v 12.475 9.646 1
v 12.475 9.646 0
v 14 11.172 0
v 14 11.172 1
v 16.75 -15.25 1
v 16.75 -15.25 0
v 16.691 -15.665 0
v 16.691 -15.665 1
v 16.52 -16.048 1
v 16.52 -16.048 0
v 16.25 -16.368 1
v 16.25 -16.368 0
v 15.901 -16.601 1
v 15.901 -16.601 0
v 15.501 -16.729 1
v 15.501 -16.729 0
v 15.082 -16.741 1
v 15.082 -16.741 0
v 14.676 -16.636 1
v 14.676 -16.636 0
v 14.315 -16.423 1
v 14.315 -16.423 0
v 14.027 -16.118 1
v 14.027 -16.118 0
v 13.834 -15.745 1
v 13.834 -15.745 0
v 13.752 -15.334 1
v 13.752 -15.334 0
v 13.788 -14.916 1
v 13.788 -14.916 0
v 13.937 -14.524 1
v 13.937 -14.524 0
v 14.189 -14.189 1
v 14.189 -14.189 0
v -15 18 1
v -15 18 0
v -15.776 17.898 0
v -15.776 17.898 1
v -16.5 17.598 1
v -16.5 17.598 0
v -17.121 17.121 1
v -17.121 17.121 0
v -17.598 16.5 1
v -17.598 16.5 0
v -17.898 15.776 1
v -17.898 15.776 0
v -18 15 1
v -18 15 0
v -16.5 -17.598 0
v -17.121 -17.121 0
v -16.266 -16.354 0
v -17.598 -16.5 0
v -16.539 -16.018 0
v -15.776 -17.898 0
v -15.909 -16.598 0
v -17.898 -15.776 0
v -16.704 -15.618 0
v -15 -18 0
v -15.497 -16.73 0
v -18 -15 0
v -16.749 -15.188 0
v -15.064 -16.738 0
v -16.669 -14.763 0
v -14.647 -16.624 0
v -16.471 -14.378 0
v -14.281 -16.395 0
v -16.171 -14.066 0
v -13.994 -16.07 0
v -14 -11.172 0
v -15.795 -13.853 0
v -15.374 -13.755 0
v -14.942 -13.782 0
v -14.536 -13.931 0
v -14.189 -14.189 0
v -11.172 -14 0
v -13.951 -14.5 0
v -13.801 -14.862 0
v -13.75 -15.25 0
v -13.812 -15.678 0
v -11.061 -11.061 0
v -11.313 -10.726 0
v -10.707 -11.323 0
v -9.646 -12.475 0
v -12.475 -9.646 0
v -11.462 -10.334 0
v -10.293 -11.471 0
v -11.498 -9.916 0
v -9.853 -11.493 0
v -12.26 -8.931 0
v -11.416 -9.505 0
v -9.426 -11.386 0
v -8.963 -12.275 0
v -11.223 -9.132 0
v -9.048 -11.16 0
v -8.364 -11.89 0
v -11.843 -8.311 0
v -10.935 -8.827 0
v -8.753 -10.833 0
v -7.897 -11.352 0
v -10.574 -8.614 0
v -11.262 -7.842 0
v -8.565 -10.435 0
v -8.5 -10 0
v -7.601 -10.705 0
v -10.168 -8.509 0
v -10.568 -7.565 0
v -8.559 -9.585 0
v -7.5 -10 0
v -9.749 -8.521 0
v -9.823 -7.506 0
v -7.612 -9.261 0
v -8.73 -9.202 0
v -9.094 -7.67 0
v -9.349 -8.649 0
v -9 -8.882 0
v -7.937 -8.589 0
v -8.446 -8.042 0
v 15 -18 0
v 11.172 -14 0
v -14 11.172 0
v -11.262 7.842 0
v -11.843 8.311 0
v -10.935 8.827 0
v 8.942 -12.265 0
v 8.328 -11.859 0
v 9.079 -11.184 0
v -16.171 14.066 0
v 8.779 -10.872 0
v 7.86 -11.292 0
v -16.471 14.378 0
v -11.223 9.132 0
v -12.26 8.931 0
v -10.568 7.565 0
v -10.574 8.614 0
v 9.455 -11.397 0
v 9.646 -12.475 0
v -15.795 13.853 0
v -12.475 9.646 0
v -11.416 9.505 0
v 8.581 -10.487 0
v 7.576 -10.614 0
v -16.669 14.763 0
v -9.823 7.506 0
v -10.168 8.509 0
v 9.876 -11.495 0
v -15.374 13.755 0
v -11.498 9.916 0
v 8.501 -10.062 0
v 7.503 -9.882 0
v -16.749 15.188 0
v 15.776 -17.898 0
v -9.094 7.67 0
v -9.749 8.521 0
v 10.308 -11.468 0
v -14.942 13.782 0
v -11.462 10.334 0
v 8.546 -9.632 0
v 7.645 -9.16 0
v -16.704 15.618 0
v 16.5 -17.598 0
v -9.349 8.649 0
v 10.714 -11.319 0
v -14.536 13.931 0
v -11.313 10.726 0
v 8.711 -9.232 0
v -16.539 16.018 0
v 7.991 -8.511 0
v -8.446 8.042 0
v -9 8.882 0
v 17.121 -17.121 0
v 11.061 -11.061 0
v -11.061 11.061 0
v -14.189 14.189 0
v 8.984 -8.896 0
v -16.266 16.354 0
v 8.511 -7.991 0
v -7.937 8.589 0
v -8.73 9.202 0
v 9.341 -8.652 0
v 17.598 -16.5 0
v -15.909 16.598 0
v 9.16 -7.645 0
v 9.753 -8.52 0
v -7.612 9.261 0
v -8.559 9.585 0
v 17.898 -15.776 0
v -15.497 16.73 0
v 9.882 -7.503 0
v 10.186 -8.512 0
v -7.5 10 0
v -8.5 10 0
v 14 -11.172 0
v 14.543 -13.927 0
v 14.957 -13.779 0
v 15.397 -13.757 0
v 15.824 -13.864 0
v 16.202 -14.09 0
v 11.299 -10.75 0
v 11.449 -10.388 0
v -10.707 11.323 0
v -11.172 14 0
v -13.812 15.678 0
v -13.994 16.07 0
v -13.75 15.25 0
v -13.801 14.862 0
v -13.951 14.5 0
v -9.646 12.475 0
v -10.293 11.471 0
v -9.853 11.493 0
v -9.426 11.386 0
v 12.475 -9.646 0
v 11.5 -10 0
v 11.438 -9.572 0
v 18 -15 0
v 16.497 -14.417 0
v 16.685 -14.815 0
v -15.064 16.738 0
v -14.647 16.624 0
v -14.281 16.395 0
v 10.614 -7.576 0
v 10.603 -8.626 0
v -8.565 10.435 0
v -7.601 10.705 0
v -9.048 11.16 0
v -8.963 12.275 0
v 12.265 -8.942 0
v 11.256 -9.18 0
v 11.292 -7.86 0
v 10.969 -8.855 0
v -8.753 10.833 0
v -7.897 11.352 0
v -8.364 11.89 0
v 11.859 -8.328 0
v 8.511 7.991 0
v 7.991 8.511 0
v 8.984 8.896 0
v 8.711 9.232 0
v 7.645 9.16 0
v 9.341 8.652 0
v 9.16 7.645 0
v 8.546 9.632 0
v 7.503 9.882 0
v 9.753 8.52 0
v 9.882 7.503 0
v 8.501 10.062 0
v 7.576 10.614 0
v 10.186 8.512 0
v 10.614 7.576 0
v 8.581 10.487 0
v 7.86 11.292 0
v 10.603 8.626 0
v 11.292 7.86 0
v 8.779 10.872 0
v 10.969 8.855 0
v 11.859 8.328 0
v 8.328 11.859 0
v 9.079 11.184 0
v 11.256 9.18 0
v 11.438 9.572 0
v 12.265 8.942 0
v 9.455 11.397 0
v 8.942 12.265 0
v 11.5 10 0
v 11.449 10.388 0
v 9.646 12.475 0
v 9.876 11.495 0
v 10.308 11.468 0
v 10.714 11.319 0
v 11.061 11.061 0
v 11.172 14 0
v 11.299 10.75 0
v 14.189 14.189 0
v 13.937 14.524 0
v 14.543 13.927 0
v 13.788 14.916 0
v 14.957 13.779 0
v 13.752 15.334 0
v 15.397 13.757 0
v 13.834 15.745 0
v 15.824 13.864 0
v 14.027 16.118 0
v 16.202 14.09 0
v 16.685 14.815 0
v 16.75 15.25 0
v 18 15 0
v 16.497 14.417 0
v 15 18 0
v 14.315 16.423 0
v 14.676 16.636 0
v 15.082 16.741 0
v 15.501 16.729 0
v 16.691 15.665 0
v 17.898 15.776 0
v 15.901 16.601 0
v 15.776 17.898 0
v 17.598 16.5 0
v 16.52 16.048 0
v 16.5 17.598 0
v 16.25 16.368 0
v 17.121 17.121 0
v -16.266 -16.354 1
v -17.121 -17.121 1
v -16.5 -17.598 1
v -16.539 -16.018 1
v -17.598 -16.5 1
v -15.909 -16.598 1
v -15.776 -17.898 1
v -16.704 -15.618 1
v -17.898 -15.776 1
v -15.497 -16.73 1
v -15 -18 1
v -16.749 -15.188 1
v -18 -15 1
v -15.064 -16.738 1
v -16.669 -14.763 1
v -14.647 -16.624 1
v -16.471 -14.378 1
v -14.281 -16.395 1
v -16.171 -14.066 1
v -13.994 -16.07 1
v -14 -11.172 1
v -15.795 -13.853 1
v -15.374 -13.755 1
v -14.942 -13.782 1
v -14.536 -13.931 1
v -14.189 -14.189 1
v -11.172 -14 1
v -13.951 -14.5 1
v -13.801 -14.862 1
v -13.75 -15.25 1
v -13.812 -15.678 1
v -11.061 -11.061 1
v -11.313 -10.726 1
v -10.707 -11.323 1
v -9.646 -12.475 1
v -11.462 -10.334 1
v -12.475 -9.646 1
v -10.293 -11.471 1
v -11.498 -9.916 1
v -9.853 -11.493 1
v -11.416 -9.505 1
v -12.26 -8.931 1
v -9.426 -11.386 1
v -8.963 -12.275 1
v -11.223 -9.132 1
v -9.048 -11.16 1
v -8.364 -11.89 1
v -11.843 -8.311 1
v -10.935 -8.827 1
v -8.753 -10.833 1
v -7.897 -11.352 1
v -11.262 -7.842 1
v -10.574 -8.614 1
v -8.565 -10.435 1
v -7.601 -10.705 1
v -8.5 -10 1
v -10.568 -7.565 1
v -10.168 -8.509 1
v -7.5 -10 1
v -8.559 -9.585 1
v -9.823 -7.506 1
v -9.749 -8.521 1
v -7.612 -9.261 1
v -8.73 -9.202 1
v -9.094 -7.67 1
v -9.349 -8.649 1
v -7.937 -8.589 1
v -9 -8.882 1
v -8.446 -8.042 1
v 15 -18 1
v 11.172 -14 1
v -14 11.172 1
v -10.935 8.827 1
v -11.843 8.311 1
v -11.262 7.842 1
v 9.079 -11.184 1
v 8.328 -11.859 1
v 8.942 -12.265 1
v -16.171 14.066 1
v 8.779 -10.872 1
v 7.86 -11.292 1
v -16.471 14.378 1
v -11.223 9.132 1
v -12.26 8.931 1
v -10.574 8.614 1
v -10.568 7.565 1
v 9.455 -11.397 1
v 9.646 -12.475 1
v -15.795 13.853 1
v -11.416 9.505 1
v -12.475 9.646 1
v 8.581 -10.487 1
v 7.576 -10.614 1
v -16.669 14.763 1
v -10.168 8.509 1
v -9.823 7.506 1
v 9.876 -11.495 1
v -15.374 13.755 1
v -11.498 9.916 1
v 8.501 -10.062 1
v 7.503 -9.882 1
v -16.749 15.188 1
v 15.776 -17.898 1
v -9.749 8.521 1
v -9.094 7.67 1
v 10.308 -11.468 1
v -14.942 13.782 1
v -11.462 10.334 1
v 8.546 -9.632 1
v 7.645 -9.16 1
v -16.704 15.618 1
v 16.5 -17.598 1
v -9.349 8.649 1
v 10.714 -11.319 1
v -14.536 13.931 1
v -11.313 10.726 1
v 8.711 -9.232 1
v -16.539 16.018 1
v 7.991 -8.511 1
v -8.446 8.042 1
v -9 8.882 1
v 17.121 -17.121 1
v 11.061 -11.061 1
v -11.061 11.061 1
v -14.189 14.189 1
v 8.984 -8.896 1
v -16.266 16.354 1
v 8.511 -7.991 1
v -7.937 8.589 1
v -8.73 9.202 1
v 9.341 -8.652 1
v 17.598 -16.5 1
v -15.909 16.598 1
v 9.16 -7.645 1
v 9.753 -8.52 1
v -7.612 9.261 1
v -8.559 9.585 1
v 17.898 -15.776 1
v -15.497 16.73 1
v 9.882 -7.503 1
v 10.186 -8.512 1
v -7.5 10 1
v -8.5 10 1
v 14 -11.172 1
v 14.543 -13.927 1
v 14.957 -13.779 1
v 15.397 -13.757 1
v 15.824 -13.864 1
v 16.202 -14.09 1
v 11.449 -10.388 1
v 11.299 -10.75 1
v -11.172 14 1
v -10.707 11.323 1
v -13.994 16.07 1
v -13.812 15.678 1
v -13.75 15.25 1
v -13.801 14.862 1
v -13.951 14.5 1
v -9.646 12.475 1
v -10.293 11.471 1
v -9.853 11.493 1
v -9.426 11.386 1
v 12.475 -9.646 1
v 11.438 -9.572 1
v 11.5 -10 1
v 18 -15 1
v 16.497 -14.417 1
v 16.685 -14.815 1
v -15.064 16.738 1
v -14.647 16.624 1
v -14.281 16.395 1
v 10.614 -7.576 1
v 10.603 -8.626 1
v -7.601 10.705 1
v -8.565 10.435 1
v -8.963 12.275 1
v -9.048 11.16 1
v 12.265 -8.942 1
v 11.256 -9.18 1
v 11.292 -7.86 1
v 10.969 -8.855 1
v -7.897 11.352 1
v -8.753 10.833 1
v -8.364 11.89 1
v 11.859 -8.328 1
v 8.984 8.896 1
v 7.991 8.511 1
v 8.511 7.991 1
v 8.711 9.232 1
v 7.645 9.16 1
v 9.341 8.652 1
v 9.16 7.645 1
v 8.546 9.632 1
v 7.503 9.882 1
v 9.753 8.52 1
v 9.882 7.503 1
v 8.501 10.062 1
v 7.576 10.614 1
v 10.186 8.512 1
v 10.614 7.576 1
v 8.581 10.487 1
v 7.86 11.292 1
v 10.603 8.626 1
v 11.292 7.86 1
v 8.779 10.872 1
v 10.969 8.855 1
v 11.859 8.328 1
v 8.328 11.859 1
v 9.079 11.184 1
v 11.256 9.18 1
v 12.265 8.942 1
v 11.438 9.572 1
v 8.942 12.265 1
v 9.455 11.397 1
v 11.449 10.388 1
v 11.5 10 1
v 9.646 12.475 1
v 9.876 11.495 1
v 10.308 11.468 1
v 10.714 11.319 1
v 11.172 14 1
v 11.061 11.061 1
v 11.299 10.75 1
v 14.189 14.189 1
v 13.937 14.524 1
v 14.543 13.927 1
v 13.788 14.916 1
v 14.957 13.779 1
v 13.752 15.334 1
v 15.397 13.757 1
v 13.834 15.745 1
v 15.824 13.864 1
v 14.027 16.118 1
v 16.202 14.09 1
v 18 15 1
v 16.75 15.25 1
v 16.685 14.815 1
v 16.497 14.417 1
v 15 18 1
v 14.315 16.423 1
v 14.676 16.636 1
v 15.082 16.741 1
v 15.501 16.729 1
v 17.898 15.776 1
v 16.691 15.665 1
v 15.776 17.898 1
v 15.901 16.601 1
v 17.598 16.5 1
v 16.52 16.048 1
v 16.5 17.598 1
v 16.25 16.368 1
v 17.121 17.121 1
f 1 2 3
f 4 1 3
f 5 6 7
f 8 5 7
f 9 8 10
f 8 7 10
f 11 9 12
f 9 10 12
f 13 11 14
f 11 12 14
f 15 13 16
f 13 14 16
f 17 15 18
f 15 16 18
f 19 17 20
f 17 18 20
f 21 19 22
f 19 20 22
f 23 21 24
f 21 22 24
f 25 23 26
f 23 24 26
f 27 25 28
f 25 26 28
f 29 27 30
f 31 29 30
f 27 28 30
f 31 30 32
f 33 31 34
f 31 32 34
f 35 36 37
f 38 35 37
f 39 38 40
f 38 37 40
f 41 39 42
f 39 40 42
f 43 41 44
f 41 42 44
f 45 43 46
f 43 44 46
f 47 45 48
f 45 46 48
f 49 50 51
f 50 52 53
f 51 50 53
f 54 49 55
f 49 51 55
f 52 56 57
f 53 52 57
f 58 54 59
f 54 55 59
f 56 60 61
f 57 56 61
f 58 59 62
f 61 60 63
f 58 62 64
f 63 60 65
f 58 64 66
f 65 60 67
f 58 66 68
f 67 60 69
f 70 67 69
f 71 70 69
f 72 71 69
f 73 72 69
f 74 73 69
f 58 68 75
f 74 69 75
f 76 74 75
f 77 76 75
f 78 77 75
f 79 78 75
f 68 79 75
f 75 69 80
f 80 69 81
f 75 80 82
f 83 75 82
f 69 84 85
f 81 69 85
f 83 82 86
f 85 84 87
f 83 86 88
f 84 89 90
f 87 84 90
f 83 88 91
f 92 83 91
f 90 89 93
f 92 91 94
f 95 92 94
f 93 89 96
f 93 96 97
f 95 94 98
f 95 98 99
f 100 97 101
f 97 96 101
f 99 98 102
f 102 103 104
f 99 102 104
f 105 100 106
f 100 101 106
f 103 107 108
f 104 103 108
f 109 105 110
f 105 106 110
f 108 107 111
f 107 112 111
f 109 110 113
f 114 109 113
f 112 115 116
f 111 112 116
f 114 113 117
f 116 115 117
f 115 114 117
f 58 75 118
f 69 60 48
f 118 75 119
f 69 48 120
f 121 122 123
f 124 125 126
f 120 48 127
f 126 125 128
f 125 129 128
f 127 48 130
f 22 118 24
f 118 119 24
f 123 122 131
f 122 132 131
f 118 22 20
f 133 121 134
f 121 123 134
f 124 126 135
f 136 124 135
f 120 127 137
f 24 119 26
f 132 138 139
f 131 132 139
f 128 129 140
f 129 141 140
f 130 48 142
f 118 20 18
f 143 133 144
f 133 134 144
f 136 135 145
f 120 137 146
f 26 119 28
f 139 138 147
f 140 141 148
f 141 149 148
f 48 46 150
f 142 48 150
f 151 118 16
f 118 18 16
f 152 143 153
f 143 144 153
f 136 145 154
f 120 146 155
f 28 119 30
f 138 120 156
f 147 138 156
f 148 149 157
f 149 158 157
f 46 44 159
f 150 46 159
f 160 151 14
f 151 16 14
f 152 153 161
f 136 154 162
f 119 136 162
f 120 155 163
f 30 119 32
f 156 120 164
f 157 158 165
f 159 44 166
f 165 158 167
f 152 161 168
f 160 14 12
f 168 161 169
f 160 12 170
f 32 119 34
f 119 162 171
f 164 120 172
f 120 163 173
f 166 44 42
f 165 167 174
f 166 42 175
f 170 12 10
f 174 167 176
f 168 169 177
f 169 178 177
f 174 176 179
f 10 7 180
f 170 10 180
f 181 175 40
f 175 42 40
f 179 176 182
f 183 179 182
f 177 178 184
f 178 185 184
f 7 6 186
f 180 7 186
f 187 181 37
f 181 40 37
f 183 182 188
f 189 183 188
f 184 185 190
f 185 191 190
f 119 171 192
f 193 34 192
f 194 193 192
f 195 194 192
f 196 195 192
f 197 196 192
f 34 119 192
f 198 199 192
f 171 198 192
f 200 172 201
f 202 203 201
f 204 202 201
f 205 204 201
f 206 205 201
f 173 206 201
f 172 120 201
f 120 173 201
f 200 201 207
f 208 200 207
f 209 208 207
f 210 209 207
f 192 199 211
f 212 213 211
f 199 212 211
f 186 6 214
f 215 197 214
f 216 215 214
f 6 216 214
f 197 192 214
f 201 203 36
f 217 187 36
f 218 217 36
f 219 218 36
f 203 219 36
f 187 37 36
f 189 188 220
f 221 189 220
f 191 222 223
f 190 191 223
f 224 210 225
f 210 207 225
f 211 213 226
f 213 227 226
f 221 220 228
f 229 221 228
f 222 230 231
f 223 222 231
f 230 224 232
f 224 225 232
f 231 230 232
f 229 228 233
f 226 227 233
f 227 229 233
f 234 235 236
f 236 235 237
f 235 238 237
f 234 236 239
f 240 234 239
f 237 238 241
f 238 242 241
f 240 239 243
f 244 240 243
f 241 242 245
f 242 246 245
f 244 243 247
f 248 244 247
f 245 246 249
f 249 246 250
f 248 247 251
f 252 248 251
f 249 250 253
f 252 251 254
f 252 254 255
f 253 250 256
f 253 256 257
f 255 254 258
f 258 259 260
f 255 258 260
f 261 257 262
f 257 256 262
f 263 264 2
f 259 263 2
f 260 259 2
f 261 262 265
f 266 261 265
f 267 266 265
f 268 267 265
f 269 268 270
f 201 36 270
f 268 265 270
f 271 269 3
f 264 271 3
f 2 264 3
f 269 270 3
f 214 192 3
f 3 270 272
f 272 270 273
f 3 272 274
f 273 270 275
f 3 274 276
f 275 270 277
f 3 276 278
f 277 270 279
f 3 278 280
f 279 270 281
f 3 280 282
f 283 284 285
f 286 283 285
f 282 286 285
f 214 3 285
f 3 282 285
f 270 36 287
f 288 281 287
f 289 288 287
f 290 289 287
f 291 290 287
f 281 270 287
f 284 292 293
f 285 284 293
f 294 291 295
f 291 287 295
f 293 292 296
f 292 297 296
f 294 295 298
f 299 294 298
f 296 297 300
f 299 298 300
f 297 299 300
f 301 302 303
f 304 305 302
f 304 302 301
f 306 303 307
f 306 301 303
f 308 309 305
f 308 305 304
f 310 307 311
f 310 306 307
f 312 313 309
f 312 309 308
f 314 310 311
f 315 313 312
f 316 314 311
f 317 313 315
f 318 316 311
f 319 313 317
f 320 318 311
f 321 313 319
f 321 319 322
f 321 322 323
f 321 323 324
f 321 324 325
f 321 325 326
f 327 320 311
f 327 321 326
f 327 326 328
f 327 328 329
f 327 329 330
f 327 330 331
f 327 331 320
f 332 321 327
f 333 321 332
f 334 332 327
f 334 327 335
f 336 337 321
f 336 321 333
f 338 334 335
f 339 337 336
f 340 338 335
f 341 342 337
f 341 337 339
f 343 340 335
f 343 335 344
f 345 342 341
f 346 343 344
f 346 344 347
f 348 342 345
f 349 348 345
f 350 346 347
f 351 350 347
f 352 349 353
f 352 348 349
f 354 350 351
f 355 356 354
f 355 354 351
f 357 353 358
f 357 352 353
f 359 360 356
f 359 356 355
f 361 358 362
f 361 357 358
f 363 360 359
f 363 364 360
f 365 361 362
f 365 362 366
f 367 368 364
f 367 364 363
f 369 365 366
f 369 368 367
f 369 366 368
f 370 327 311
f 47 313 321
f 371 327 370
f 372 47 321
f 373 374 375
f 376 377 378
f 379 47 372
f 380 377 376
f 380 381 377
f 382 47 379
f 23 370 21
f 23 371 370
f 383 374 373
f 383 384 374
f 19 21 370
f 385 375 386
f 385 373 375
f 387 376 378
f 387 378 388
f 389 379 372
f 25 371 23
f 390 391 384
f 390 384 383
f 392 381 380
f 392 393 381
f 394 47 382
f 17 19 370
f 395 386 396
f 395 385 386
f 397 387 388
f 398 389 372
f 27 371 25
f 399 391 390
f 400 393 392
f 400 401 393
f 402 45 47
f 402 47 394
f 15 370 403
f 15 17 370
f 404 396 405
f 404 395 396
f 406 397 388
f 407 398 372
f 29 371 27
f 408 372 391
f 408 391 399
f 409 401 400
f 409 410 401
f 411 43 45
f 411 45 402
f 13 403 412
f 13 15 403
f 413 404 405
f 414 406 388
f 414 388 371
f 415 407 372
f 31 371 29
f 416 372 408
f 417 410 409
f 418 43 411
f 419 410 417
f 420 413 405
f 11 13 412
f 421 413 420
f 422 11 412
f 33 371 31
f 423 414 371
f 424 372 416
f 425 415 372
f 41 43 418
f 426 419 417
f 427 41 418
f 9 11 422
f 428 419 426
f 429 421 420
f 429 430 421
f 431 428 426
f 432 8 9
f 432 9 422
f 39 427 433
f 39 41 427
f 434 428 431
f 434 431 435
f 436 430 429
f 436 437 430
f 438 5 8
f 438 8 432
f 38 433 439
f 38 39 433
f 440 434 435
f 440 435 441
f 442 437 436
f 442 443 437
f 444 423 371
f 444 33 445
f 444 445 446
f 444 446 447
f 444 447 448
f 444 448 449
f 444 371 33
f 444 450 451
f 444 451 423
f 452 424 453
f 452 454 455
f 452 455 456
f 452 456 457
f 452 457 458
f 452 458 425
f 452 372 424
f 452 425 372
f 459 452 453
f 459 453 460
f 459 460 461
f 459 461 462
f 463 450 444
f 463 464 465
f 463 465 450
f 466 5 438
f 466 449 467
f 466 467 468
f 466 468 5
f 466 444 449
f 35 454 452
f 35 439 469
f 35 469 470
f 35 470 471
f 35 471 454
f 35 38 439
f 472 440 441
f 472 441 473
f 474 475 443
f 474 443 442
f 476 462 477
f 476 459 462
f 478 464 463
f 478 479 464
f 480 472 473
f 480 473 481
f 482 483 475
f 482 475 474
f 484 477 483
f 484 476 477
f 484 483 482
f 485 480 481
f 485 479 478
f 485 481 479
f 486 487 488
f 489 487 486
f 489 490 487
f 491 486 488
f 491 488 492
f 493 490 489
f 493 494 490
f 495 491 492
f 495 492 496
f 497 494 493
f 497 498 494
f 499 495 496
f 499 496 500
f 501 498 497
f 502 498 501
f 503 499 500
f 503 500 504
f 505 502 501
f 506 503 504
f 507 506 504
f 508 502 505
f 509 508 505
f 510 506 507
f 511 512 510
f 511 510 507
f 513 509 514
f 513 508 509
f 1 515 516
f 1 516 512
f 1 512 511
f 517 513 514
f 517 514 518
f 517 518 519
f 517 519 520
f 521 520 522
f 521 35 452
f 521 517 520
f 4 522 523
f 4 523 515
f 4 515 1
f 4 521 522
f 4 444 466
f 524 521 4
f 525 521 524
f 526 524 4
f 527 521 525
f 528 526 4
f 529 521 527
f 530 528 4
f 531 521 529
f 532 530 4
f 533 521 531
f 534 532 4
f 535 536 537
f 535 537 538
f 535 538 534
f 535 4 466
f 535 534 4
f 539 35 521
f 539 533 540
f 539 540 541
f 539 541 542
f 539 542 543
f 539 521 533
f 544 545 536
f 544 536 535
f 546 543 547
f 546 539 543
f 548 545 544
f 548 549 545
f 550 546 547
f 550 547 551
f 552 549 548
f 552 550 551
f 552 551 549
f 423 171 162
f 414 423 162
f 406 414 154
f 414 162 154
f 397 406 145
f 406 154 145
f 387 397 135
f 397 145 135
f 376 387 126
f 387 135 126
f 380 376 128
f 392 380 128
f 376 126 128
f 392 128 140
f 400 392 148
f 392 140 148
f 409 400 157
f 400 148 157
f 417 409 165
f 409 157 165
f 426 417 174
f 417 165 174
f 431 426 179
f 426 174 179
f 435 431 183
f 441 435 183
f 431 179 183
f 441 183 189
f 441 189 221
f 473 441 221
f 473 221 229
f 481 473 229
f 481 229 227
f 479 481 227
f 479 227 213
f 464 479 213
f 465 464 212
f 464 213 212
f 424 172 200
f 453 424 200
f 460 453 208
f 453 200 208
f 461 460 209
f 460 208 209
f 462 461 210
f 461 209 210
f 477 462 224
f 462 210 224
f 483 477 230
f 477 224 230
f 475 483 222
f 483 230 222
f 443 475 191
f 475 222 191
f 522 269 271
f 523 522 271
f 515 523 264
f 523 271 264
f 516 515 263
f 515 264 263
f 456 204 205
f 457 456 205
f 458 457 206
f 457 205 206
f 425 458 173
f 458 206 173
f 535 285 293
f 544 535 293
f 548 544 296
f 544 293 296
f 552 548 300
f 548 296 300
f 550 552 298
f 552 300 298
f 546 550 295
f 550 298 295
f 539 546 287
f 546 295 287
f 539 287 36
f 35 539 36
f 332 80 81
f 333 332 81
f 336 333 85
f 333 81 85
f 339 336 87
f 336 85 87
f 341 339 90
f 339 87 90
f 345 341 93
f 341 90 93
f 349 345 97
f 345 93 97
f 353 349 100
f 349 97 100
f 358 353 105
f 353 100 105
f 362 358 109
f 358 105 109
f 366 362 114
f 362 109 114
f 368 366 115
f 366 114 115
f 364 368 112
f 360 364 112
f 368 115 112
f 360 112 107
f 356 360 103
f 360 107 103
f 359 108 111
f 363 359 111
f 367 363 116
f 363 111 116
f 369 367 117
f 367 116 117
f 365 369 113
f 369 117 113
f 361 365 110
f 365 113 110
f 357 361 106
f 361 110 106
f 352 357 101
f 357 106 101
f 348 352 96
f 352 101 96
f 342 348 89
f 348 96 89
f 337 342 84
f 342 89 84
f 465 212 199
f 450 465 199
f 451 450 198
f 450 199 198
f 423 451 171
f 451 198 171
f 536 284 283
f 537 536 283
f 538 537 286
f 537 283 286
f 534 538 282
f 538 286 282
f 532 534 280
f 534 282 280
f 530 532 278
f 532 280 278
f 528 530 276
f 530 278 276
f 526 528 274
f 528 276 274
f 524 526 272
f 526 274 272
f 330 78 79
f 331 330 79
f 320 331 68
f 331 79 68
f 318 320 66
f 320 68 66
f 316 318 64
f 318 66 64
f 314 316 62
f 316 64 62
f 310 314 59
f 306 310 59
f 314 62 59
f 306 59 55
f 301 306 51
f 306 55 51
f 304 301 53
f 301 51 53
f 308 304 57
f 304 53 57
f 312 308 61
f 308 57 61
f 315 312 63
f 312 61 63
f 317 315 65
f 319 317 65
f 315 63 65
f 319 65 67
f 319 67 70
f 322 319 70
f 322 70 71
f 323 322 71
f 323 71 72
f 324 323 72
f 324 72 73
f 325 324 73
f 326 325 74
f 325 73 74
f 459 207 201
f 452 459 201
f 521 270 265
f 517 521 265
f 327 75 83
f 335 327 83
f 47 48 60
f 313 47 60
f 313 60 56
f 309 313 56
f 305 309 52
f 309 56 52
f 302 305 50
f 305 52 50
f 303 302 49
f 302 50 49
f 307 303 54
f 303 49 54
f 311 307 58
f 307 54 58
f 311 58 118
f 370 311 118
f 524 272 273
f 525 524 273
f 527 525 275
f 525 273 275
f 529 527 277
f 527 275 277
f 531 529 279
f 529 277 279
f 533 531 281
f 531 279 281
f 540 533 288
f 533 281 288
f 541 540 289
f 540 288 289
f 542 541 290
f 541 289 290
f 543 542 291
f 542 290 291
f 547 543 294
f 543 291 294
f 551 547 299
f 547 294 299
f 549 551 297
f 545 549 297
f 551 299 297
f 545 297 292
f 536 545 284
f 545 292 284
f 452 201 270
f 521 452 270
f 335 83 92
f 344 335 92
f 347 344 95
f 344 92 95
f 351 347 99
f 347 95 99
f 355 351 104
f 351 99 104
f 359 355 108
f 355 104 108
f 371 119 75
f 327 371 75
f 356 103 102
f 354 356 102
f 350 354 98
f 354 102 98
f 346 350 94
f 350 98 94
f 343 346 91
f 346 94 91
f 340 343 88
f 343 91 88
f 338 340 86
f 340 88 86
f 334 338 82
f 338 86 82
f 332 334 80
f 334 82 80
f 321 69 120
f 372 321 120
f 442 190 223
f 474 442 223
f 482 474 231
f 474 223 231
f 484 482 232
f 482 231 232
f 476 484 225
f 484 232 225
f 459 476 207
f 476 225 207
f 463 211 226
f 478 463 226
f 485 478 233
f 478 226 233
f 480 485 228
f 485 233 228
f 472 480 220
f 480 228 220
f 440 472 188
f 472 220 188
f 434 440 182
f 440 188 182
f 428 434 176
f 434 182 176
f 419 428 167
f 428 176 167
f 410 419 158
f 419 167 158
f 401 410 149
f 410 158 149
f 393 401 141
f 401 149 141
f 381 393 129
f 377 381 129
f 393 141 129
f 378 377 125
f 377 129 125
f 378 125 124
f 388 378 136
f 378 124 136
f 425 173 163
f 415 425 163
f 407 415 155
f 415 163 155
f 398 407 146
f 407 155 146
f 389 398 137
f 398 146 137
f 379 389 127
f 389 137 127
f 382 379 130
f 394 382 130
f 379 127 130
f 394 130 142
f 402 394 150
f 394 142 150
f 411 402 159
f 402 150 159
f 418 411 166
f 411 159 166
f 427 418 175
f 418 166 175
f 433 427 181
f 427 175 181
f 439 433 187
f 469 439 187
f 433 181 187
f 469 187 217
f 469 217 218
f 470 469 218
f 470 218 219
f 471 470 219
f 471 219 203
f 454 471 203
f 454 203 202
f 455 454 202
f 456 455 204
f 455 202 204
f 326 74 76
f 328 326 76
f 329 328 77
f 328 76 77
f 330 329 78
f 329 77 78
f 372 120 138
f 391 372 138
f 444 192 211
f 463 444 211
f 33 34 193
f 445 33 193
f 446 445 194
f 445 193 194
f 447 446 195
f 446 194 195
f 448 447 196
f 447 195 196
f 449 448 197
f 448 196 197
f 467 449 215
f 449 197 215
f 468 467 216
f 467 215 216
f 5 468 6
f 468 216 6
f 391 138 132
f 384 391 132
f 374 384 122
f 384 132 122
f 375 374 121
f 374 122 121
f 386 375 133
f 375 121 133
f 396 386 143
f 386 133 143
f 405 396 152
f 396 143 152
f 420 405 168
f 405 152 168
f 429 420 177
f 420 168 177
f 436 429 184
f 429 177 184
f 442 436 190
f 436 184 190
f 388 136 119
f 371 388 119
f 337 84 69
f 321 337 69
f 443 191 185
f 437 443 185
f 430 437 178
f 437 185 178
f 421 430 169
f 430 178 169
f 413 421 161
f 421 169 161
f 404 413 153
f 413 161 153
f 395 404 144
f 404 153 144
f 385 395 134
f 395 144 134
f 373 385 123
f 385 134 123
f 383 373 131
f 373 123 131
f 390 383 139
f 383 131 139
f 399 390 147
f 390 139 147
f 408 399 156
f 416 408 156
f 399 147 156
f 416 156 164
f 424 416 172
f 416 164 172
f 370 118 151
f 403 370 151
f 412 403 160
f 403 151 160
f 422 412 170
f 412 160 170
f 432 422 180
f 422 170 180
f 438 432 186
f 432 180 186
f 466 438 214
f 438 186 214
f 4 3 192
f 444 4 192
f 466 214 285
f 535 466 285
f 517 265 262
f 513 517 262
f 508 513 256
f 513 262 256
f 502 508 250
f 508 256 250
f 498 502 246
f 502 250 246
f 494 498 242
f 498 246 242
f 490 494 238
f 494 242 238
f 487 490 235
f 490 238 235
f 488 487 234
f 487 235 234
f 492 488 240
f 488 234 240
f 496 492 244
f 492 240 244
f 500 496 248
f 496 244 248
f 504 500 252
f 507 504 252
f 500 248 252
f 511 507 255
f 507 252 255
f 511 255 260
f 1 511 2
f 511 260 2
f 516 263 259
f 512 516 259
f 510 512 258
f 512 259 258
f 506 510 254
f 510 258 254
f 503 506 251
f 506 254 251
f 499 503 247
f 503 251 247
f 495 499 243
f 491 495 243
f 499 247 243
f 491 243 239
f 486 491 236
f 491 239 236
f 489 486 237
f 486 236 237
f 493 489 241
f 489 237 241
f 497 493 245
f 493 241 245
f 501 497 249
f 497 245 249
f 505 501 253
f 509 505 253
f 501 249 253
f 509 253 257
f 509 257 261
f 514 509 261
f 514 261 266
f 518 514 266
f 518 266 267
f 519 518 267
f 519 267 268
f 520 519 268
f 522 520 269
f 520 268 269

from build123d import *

# Parameters (mm, degrees)
F1_DEPTH = 1


with BuildPart() as f1:
    # F0 (on Top) → F1 (new body)
    with BuildSketch(Plane.XY):
        with BuildLine():
            Line((15, 18), (-15, 18))
            ThreePointArc((-15, 18), (-17.1213203436, 17.1213203436), (-18, 15))
            Line((-18, 15), (-18, -15))
            ThreePointArc((-18, -15), (-17.1213203436, -17.1213203436), (-15, -18))
            Line((-15, -18), (15, -18))
            ThreePointArc((15, -18), (17.1213203436, -17.1213203436), (18, -15))
            Line((18, -15), (18, 15))
            ThreePointArc((18, 15), (17.1213203436, 17.1213203436), (15, 18))
        make_face()
        with BuildLine():
            ThreePointArc((-13.75, -15.25), (-16.6358192988, -15.8240251485), (-14.1893398282, -14.1893398282))
            ThreePointArc((-14.1893398282, -14.1893398282), (-13.8641807012, -14.6759748515), (-13.75, -15.25))
        make_face(mode=Mode.SUBTRACT)
        with BuildLine():
            ThreePointArc((16.75, -15.25), (14.6759748515, -16.6358192988), (14.1893398282, -14.1893398282))
            ThreePointArc((14.1893398282, -14.1893398282), (15.8240251485, -13.8641807012), (16.75, -15.25))
        make_face(mode=Mode.SUBTRACT)
        with BuildLine():
            ThreePointArc((-13.75, 15.25), (-13.8641807012, 14.6759748515), (-14.1893398282, 14.1893398282))
            ThreePointArc((-14.1893398282, 14.1893398282), (-16.6358192988, 15.8240251485), (-13.75, 15.25))
        make_face(mode=Mode.SUBTRACT)
        Polygon((-14, 11.1715728753), (-14, 14), (-11.1715728753, 14), (11.1715728753, 14), (14, 14), (14, 11.1715728753), (14, -11.1715728753), (14, -14), (11.1715728753, -14), (-11.1715728753, -14), (-14, -14), (-14, -11.1715728753), align=None, mode=Mode.SUBTRACT)
        with BuildLine():
            ThreePointArc((16.75, 15.25), (15.8240251485, 13.8641807012), (14.1893398282, 14.1893398282))
            ThreePointArc((14.1893398282, 14.1893398282), (14.6759748515, 16.6358192988), (16.75, 15.25))
        make_face(mode=Mode.SUBTRACT)
        with BuildLine():
            Line((-14, 14), (-11.767766953, 11.767766953))
            ThreePointArc((-11.767766953, 11.767766953), (-10.790569415, 12.3717082451), (-9.6464466094, 12.4748737342))
            Line((-9.6464466094, 12.4748737342), (-11.1715728753, 14))
            Line((-11.1715728753, 14), (-14, 14))
        make_face()
        with BuildLine():
            ThreePointArc((-12.4748737342, 9.6464466094), (-12.3717082451, 10.790569415), (-11.767766953, 11.767766953))
            Line((-11.767766953, 11.767766953), (-14, 14))
            Line((-14, 14), (-14, 11.1715728753))
            Line((-14, 11.1715728753), (-12.4748737342, 9.6464466094))
        make_face()
        with BuildLine():
            ThreePointArc((-9.6464466094, 12.4748737342), (-10.790569415, 12.3717082451), (-11.767766953, 11.767766953))
            ThreePointArc((-11.767766953, 11.767766953), (-12.3717082451, 10.790569415), (-12.4748737342, 9.6464466094))
            ThreePointArc((-12.4748737342, 9.6464466094), (-9.8227774498, 7.506289478), (-7.5, 10))
            ThreePointArc((-7.5, 10), (-8.1113651125, 11.6380043534), (-9.6464466094, 12.4748737342))
        make_face()
        with BuildLine():
            ThreePointArc((-11.0606601718, 11.0606601718), (-9.4259748515, 11.3858192988), (-8.5, 10))
            ThreePointArc((-8.5, 10), (-10.5740251485, 8.6141807012), (-11.0606601718, 11.0606601718))
        make_face(mode=Mode.SUBTRACT)
        with BuildLine():
            Line((14, 14), (11.1715728753, 14))
            Line((11.1715728753, 14), (9.6464466094, 12.4748737342))
            ThreePointArc((9.6464466094, 12.4748737342), (10.790569415, 12.3717082451), (11.767766953, 11.767766953))
            Line((11.767766953, 11.767766953), (14, 14))
        make_face()
        with BuildLine():
            Line((14, 11.1715728753), (14, 14))
            Line((14, 14), (11.767766953, 11.767766953))
            ThreePointArc((11.767766953, 11.767766953), (12.3096988313, 10.9567085809), (12.5, 10))
            ThreePointArc((12.5, 10), (12.493710522, 9.8227774498), (12.4748737342, 9.6464466094))
            Line((12.4748737342, 9.6464466094), (14, 11.1715728753))
        make_face()
        with BuildLine():
            ThreePointArc((11.767766953, 11.767766953), (10.790569415, 12.3717082451), (9.6464466094, 12.4748737342))
            ThreePointArc((9.6464466094, 12.4748737342), (8.232233047, 8.232233047), (12.4748737342, 9.6464466094))
            ThreePointArc((12.4748737342, 9.6464466094), (12.493710522, 9.8227774498), (12.5, 10))
            ThreePointArc((12.5, 10), (12.3096988313, 10.9567085809), (11.767766953, 11.767766953))
        make_face()
        with BuildLine():
            ThreePointArc((11.5, 10), (8.6141807012, 9.4259748515), (11.0606601718, 11.0606601718))
            ThreePointArc((11.0606601718, 11.0606601718), (11.3858192988, 10.5740251485), (11.5, 10))
        make_face(mode=Mode.SUBTRACT)
        with BuildLine():
            Line((14, -14), (14, -11.1715728753))
            Line((14, -11.1715728753), (12.4748737342, -9.6464466094))
            ThreePointArc((12.4748737342, -9.6464466094), (12.493710522, -9.8227774498), (12.5, -10))
            ThreePointArc((12.5, -10), (12.3096988313, -10.9567085809), (11.767766953, -11.767766953))
            Line((11.767766953, -11.767766953), (14, -14))
        make_face()
        with BuildLine():
            Line((9.6464466094, -12.4748737342), (11.1715728753, -14))
            Line((11.1715728753, -14), (14, -14))
            Line((14, -14), (11.767766953, -11.767766953))
            ThreePointArc((11.767766953, -11.767766953), (10.790569415, -12.3717082451), (9.6464466094, -12.4748737342))
        make_face()
        with BuildLine():
            ThreePointArc((12.5, -10), (12.493710522, -9.8227774498), (12.4748737342, -9.6464466094))
            ThreePointArc((12.4748737342, -9.6464466094), (8.232233047, -8.232233047), (9.6464466094, -12.4748737342))
            ThreePointArc((9.6464466094, -12.4748737342), (10.790569415, -12.3717082451), (11.767766953, -11.767766953))
            ThreePointArc((11.767766953, -11.767766953), (12.3096988313, -10.9567085809), (12.5, -10))
        make_face()
        with BuildLine():
            ThreePointArc((11.5, -10), (11.3858192988, -10.5740251485), (11.0606601718, -11.0606601718))
            ThreePointArc((11.0606601718, -11.0606601718), (8.6141807012, -9.4259748515), (11.5, -10))
        make_face(mode=Mode.SUBTRACT)
        with BuildLine():
            ThreePointArc((-7.5, -10), (-9.8227774498, -7.506289478), (-12.4748737342, -9.6464466094))
            ThreePointArc((-12.4748737342, -9.6464466094), (-12.3717082451, -10.790569415), (-11.767766953, -11.767766953))
            ThreePointArc((-11.767766953, -11.767766953), (-10.790569415, -12.3717082451), (-9.6464466094, -12.4748737342))
            ThreePointArc((-9.6464466094, -12.4748737342), (-8.1113651125, -11.6380043534), (-7.5, -10))
        make_face()
        with BuildLine():
            ThreePointArc((-8.5, -10), (-9.4259748515, -11.3858192988), (-11.0606601718, -11.0606601718))
            ThreePointArc((-11.0606601718, -11.0606601718), (-10.5740251485, -8.6141807012), (-8.5, -10))
        make_face(mode=Mode.SUBTRACT)
        with BuildLine():
            Line((-12.4748737342, -9.6464466094), (-14, -11.1715728753))
            Line((-14, -11.1715728753), (-14, -14))
            Line((-14, -14), (-11.767766953, -11.767766953))
            ThreePointArc((-11.767766953, -11.767766953), (-12.3717082451, -10.790569415), (-12.4748737342, -9.6464466094))
        make_face()
        with BuildLine():
            Line((-11.767766953, -11.767766953), (-14, -14))
            Line((-14, -14), (-11.1715728753, -14))
            Line((-11.1715728753, -14), (-9.6464466094, -12.4748737342))
            ThreePointArc((-9.6464466094, -12.4748737342), (-10.790569415, -12.3717082451), (-11.767766953, -11.767766953))
        make_face()
    extrude(amount=F1_DEPTH)


solid = f1.part
